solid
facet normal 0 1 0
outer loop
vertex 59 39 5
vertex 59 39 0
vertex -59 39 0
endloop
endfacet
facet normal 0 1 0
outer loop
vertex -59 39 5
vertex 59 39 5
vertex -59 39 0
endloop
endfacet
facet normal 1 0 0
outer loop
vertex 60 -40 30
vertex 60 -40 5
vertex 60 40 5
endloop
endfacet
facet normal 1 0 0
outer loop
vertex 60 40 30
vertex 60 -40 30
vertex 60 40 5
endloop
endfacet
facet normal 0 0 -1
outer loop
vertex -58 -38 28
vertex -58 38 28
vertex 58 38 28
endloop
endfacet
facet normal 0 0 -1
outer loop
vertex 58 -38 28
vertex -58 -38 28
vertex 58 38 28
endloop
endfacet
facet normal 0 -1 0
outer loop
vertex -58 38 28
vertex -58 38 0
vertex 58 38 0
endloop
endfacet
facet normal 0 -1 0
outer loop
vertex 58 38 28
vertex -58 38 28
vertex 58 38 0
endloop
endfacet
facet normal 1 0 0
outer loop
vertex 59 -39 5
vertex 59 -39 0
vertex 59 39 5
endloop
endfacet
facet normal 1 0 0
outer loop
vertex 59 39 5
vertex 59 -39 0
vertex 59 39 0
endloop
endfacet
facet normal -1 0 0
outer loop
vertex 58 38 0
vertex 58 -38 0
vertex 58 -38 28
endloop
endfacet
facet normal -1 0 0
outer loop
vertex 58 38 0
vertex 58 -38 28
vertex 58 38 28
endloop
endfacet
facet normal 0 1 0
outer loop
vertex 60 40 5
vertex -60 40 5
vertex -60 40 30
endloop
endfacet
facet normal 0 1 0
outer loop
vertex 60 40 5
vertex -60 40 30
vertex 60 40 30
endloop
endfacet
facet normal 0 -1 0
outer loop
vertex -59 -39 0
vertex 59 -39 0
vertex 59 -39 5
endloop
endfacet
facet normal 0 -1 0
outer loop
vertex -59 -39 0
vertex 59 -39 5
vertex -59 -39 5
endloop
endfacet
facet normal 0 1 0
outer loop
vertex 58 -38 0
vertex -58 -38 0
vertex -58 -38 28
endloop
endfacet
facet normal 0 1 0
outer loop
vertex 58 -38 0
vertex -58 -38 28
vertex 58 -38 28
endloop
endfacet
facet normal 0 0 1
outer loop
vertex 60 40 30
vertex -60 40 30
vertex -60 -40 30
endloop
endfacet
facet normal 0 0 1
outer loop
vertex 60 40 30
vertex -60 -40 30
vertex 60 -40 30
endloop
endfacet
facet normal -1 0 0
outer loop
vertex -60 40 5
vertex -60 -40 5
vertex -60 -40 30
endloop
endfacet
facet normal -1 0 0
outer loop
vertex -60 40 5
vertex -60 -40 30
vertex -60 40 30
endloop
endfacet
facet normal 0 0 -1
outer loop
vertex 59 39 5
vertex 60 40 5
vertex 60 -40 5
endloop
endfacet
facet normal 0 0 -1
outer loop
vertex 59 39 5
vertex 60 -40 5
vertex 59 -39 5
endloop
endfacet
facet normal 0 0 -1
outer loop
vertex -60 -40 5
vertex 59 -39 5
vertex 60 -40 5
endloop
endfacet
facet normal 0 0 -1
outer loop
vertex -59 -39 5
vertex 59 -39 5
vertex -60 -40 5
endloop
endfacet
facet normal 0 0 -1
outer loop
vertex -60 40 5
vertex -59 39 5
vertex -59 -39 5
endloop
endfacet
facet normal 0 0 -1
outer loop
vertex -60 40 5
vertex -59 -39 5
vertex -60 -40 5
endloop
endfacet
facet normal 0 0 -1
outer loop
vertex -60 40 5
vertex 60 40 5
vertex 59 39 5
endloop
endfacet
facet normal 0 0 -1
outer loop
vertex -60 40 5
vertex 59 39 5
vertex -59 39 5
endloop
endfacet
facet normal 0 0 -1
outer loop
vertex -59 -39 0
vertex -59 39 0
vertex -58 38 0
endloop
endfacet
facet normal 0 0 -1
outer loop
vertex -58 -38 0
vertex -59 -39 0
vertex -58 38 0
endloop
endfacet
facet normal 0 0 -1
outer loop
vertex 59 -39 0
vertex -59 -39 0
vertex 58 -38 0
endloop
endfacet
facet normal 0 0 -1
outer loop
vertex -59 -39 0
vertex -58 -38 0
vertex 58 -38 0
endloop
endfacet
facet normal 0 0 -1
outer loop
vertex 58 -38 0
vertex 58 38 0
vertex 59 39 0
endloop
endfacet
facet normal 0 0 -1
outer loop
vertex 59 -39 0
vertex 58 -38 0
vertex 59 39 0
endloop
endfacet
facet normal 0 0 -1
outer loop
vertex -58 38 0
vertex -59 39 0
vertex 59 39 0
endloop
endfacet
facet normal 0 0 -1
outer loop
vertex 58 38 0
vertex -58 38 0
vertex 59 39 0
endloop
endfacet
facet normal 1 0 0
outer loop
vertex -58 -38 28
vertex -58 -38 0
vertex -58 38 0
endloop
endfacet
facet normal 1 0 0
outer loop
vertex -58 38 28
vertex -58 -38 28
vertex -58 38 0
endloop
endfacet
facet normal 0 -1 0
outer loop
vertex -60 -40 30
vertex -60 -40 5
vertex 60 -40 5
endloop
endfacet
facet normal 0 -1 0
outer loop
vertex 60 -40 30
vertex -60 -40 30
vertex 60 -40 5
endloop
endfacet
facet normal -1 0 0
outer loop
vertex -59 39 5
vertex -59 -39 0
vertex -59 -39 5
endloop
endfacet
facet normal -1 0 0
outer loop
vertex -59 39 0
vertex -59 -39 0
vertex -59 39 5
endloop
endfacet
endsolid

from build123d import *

# Parameters (mm, degrees)
SKETCH1_W           = 120
SKETCH1_H           = 80
BOSS_EXTRUDE1_DEPTH = 30
SHELL1_T            = -2
SKETCH10_W          = 120
SKETCH10_H          = 80
SKETCH10_W_2        = 118
SKETCH10_H_2        = 78
CUT_EXTRUDE1_DEPTH  = 5


with BuildPart() as part:
    # Sketch1 → Boss-Extrude1 (new body)
    with BuildSketch(Plane.XY):
        Rectangle(SKETCH1_W, SKETCH1_H)
    extrude(amount=BOSS_EXTRUDE1_DEPTH)

    # Shell1
    shell1_openings = [part.faces().sort_by_distance(p)[0] for p in [
        (0, 0, 0),
    ]]
    offset(amount=SHELL1_T, openings=shell1_openings, kind=Kind.INTERSECTION)

    # Sketch10 → Cut-Extrude1 (cut)
    with BuildSketch(Plane(origin=(0, 0, 0), x_dir=(-1, 0, 0), z_dir=(0, 0, -1))):
        Rectangle(SKETCH10_W, SKETCH10_H)
        Rectangle(SKETCH10_W_2, SKETCH10_H_2, mode=Mode.SUBTRACT)
    extrude(amount=-CUT_EXTRUDE1_DEPTH, mode=Mode.SUBTRACT)


solid = part.part
